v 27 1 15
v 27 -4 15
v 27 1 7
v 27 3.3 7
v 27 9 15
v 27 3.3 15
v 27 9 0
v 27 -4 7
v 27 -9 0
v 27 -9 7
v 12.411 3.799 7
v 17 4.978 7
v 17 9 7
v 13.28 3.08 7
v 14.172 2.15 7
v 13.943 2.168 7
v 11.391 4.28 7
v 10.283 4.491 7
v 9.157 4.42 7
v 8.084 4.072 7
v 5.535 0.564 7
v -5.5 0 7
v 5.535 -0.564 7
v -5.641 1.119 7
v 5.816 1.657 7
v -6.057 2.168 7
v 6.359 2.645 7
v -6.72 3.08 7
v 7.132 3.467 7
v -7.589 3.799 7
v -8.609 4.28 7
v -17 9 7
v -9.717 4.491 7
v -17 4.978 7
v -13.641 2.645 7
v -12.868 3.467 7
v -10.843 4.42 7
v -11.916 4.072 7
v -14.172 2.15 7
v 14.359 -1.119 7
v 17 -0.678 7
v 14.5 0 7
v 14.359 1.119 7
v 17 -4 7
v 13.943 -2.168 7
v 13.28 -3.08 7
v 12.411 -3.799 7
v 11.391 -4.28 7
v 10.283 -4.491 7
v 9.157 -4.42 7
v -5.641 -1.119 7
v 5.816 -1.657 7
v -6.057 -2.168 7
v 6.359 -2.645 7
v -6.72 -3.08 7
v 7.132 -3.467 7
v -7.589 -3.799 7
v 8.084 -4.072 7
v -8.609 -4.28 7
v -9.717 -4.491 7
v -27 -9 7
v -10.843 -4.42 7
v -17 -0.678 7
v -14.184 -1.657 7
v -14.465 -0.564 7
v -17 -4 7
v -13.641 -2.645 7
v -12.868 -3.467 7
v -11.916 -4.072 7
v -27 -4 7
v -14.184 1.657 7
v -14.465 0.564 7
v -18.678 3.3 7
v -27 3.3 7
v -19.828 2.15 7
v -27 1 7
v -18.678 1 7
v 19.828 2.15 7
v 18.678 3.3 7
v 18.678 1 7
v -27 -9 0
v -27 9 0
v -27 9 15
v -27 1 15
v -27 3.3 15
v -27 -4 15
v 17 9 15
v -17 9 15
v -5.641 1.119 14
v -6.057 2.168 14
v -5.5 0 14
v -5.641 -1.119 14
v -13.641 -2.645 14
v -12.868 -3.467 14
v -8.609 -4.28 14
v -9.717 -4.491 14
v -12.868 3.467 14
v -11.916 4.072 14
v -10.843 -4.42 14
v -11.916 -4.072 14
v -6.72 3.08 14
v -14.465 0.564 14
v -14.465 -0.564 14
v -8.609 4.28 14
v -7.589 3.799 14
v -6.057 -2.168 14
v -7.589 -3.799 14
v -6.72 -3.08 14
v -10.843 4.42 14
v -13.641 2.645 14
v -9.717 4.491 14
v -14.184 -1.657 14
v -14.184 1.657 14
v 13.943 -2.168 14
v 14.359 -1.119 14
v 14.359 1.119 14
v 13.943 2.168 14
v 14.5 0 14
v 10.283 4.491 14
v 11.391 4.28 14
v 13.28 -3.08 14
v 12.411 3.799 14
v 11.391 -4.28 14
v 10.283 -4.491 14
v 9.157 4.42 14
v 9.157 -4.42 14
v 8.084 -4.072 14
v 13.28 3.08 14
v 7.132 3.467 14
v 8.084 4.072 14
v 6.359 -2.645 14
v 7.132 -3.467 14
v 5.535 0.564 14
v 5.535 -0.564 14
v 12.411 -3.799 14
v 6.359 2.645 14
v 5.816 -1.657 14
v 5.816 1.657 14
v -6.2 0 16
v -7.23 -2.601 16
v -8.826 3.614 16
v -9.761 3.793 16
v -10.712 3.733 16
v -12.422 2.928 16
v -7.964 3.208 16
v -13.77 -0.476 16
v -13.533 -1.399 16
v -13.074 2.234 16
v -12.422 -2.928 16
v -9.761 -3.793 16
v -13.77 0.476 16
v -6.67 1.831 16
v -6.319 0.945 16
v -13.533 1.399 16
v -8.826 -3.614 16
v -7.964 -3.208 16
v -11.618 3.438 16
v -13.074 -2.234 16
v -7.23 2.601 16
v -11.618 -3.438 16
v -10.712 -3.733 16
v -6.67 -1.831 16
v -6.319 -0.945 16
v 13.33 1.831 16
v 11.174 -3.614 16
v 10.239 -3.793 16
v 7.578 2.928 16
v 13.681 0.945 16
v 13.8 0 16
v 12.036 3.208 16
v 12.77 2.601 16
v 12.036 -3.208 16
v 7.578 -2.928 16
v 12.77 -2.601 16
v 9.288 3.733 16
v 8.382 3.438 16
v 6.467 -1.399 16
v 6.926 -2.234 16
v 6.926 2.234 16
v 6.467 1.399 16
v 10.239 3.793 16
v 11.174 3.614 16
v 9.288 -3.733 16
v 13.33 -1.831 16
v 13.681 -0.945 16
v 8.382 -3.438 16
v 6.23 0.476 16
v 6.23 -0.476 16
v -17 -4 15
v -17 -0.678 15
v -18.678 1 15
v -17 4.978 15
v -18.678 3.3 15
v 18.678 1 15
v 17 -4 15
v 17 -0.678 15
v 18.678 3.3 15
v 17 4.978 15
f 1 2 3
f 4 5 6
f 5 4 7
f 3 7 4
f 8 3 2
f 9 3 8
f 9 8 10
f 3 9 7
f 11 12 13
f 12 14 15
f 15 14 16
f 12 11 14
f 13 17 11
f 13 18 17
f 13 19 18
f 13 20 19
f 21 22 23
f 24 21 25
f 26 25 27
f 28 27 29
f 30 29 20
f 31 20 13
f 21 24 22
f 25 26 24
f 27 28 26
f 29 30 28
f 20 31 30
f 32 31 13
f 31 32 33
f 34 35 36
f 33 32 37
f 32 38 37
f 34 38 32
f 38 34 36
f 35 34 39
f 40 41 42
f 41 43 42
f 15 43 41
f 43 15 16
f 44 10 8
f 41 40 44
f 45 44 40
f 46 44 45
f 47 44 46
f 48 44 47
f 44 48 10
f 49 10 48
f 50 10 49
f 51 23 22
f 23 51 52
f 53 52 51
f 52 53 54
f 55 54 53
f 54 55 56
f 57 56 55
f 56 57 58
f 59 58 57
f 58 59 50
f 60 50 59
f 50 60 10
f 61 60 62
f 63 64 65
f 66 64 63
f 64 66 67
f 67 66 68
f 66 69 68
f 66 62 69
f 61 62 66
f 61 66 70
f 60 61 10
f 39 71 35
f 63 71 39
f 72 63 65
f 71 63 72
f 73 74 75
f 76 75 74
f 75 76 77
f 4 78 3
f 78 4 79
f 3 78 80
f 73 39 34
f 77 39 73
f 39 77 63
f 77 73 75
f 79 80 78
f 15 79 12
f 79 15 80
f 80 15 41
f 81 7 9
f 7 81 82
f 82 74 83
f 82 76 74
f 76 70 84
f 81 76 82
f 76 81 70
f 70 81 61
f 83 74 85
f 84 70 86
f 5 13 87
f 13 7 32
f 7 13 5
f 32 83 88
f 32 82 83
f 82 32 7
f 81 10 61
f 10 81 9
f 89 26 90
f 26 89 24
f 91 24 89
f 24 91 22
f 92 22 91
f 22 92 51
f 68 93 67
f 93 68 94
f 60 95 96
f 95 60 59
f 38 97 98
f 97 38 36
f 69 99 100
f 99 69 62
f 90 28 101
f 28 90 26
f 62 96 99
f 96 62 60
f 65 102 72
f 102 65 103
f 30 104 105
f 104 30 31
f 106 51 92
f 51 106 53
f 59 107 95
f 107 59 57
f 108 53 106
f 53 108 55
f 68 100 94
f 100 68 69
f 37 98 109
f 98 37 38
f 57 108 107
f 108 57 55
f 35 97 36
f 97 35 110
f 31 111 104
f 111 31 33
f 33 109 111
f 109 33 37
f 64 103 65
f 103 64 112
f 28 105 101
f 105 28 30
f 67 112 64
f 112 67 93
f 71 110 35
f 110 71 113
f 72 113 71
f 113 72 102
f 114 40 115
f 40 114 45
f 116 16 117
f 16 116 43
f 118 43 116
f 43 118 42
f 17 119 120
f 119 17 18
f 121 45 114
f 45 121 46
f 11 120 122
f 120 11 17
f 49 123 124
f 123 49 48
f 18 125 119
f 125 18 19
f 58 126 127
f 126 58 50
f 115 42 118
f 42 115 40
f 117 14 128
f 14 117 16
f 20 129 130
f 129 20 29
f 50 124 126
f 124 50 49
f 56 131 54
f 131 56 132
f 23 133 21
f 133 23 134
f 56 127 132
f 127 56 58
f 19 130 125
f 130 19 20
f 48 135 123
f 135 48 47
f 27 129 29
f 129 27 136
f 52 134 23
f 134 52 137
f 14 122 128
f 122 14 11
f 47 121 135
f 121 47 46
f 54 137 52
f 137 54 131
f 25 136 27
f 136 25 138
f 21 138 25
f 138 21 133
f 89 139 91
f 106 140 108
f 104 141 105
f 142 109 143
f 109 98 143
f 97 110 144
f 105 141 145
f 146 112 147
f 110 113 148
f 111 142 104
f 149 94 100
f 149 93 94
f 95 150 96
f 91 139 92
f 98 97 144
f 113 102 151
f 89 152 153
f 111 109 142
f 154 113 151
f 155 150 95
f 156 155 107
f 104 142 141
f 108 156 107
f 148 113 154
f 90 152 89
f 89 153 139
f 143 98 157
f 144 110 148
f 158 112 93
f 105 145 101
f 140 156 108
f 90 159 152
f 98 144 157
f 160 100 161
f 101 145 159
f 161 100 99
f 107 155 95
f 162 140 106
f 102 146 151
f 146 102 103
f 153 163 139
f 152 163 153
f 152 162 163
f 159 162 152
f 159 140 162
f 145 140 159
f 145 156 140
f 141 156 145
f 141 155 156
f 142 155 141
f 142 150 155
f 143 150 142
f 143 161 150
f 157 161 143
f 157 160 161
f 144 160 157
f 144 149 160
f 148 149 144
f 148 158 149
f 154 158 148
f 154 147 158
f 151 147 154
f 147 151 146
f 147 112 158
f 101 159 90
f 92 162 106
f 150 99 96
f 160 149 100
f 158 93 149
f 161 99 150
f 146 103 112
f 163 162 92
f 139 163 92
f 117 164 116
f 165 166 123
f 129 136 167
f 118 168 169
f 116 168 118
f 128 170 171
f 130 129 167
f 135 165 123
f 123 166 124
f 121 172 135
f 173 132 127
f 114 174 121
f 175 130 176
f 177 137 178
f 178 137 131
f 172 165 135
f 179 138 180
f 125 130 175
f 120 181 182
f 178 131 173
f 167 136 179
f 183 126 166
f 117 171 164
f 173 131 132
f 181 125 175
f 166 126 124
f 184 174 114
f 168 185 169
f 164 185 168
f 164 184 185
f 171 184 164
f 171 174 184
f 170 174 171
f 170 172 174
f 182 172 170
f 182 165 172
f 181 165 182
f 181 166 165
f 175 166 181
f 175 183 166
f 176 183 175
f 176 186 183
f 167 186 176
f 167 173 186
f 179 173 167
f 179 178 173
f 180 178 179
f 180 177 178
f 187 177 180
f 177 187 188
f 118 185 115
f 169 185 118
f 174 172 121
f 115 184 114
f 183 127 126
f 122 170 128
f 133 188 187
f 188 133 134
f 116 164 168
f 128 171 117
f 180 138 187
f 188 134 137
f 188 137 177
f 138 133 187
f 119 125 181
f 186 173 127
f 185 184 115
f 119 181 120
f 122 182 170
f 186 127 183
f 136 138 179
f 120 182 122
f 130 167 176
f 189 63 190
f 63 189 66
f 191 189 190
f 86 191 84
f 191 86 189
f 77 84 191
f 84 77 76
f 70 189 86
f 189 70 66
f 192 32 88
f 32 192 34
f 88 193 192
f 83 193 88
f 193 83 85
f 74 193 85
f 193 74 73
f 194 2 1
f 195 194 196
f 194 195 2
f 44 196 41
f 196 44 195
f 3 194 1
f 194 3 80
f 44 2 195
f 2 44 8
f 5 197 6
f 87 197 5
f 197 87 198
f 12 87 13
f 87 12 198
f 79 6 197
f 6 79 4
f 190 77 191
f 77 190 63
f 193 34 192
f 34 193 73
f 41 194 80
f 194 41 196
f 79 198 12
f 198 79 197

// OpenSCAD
x=54/2;
y=18/2;
z=7;
module solid()
{
   
    // Belt holder base
    translate([0,0,7/2]) cube([2*x,2*y,z],true);
 
    // belt holders
    translate([-10,0,0])cylinder(r=4.5, h=14, $fn=25);
    translate([+10,0,0])cylinder(r=4.5, h=14, $fn=25); 
    translate([-10,0,14])cylinder(r1=4.5, r2=3.8, h=2, $fn=25);
    translate([+10,0,14])cylinder(r1=4.5, r2=3.8, h=2, $fn=25);
     
    // Belt Insert L
    translate([-x,-y+5,0]) cube([10,5,15]);
    translate([-x,-y+5+5+2.3,0]) cube([10,2*y-10-2.3,15]);
    // Belt Insert R
    translate([x-10,-y+5,0]) cube([10,5,15]);
    translate([x-10,-y+5+5+2.3,0]) cube([10,2*y-10-2.3,15]);
}

module cut_out()
{
    // chamfer L
    translate([-x+10,-y+10+2.3/2,15]) rotate([0,0,45])cube([4,4,16],true);
    // chamfer R
    translate([x-10,-y+10+2.3/2,15]) rotate([0,0,45])cube([4,4,16],true);    
}

module beltholder()
{
    difference()
    {
        solid();
        cut_out();
    }   
    echo("<b>beltholder(x1,x2,y1,y2,z1,z2): </b>",[-x,x,-y,y,0,16]);
}  

beltholder();
